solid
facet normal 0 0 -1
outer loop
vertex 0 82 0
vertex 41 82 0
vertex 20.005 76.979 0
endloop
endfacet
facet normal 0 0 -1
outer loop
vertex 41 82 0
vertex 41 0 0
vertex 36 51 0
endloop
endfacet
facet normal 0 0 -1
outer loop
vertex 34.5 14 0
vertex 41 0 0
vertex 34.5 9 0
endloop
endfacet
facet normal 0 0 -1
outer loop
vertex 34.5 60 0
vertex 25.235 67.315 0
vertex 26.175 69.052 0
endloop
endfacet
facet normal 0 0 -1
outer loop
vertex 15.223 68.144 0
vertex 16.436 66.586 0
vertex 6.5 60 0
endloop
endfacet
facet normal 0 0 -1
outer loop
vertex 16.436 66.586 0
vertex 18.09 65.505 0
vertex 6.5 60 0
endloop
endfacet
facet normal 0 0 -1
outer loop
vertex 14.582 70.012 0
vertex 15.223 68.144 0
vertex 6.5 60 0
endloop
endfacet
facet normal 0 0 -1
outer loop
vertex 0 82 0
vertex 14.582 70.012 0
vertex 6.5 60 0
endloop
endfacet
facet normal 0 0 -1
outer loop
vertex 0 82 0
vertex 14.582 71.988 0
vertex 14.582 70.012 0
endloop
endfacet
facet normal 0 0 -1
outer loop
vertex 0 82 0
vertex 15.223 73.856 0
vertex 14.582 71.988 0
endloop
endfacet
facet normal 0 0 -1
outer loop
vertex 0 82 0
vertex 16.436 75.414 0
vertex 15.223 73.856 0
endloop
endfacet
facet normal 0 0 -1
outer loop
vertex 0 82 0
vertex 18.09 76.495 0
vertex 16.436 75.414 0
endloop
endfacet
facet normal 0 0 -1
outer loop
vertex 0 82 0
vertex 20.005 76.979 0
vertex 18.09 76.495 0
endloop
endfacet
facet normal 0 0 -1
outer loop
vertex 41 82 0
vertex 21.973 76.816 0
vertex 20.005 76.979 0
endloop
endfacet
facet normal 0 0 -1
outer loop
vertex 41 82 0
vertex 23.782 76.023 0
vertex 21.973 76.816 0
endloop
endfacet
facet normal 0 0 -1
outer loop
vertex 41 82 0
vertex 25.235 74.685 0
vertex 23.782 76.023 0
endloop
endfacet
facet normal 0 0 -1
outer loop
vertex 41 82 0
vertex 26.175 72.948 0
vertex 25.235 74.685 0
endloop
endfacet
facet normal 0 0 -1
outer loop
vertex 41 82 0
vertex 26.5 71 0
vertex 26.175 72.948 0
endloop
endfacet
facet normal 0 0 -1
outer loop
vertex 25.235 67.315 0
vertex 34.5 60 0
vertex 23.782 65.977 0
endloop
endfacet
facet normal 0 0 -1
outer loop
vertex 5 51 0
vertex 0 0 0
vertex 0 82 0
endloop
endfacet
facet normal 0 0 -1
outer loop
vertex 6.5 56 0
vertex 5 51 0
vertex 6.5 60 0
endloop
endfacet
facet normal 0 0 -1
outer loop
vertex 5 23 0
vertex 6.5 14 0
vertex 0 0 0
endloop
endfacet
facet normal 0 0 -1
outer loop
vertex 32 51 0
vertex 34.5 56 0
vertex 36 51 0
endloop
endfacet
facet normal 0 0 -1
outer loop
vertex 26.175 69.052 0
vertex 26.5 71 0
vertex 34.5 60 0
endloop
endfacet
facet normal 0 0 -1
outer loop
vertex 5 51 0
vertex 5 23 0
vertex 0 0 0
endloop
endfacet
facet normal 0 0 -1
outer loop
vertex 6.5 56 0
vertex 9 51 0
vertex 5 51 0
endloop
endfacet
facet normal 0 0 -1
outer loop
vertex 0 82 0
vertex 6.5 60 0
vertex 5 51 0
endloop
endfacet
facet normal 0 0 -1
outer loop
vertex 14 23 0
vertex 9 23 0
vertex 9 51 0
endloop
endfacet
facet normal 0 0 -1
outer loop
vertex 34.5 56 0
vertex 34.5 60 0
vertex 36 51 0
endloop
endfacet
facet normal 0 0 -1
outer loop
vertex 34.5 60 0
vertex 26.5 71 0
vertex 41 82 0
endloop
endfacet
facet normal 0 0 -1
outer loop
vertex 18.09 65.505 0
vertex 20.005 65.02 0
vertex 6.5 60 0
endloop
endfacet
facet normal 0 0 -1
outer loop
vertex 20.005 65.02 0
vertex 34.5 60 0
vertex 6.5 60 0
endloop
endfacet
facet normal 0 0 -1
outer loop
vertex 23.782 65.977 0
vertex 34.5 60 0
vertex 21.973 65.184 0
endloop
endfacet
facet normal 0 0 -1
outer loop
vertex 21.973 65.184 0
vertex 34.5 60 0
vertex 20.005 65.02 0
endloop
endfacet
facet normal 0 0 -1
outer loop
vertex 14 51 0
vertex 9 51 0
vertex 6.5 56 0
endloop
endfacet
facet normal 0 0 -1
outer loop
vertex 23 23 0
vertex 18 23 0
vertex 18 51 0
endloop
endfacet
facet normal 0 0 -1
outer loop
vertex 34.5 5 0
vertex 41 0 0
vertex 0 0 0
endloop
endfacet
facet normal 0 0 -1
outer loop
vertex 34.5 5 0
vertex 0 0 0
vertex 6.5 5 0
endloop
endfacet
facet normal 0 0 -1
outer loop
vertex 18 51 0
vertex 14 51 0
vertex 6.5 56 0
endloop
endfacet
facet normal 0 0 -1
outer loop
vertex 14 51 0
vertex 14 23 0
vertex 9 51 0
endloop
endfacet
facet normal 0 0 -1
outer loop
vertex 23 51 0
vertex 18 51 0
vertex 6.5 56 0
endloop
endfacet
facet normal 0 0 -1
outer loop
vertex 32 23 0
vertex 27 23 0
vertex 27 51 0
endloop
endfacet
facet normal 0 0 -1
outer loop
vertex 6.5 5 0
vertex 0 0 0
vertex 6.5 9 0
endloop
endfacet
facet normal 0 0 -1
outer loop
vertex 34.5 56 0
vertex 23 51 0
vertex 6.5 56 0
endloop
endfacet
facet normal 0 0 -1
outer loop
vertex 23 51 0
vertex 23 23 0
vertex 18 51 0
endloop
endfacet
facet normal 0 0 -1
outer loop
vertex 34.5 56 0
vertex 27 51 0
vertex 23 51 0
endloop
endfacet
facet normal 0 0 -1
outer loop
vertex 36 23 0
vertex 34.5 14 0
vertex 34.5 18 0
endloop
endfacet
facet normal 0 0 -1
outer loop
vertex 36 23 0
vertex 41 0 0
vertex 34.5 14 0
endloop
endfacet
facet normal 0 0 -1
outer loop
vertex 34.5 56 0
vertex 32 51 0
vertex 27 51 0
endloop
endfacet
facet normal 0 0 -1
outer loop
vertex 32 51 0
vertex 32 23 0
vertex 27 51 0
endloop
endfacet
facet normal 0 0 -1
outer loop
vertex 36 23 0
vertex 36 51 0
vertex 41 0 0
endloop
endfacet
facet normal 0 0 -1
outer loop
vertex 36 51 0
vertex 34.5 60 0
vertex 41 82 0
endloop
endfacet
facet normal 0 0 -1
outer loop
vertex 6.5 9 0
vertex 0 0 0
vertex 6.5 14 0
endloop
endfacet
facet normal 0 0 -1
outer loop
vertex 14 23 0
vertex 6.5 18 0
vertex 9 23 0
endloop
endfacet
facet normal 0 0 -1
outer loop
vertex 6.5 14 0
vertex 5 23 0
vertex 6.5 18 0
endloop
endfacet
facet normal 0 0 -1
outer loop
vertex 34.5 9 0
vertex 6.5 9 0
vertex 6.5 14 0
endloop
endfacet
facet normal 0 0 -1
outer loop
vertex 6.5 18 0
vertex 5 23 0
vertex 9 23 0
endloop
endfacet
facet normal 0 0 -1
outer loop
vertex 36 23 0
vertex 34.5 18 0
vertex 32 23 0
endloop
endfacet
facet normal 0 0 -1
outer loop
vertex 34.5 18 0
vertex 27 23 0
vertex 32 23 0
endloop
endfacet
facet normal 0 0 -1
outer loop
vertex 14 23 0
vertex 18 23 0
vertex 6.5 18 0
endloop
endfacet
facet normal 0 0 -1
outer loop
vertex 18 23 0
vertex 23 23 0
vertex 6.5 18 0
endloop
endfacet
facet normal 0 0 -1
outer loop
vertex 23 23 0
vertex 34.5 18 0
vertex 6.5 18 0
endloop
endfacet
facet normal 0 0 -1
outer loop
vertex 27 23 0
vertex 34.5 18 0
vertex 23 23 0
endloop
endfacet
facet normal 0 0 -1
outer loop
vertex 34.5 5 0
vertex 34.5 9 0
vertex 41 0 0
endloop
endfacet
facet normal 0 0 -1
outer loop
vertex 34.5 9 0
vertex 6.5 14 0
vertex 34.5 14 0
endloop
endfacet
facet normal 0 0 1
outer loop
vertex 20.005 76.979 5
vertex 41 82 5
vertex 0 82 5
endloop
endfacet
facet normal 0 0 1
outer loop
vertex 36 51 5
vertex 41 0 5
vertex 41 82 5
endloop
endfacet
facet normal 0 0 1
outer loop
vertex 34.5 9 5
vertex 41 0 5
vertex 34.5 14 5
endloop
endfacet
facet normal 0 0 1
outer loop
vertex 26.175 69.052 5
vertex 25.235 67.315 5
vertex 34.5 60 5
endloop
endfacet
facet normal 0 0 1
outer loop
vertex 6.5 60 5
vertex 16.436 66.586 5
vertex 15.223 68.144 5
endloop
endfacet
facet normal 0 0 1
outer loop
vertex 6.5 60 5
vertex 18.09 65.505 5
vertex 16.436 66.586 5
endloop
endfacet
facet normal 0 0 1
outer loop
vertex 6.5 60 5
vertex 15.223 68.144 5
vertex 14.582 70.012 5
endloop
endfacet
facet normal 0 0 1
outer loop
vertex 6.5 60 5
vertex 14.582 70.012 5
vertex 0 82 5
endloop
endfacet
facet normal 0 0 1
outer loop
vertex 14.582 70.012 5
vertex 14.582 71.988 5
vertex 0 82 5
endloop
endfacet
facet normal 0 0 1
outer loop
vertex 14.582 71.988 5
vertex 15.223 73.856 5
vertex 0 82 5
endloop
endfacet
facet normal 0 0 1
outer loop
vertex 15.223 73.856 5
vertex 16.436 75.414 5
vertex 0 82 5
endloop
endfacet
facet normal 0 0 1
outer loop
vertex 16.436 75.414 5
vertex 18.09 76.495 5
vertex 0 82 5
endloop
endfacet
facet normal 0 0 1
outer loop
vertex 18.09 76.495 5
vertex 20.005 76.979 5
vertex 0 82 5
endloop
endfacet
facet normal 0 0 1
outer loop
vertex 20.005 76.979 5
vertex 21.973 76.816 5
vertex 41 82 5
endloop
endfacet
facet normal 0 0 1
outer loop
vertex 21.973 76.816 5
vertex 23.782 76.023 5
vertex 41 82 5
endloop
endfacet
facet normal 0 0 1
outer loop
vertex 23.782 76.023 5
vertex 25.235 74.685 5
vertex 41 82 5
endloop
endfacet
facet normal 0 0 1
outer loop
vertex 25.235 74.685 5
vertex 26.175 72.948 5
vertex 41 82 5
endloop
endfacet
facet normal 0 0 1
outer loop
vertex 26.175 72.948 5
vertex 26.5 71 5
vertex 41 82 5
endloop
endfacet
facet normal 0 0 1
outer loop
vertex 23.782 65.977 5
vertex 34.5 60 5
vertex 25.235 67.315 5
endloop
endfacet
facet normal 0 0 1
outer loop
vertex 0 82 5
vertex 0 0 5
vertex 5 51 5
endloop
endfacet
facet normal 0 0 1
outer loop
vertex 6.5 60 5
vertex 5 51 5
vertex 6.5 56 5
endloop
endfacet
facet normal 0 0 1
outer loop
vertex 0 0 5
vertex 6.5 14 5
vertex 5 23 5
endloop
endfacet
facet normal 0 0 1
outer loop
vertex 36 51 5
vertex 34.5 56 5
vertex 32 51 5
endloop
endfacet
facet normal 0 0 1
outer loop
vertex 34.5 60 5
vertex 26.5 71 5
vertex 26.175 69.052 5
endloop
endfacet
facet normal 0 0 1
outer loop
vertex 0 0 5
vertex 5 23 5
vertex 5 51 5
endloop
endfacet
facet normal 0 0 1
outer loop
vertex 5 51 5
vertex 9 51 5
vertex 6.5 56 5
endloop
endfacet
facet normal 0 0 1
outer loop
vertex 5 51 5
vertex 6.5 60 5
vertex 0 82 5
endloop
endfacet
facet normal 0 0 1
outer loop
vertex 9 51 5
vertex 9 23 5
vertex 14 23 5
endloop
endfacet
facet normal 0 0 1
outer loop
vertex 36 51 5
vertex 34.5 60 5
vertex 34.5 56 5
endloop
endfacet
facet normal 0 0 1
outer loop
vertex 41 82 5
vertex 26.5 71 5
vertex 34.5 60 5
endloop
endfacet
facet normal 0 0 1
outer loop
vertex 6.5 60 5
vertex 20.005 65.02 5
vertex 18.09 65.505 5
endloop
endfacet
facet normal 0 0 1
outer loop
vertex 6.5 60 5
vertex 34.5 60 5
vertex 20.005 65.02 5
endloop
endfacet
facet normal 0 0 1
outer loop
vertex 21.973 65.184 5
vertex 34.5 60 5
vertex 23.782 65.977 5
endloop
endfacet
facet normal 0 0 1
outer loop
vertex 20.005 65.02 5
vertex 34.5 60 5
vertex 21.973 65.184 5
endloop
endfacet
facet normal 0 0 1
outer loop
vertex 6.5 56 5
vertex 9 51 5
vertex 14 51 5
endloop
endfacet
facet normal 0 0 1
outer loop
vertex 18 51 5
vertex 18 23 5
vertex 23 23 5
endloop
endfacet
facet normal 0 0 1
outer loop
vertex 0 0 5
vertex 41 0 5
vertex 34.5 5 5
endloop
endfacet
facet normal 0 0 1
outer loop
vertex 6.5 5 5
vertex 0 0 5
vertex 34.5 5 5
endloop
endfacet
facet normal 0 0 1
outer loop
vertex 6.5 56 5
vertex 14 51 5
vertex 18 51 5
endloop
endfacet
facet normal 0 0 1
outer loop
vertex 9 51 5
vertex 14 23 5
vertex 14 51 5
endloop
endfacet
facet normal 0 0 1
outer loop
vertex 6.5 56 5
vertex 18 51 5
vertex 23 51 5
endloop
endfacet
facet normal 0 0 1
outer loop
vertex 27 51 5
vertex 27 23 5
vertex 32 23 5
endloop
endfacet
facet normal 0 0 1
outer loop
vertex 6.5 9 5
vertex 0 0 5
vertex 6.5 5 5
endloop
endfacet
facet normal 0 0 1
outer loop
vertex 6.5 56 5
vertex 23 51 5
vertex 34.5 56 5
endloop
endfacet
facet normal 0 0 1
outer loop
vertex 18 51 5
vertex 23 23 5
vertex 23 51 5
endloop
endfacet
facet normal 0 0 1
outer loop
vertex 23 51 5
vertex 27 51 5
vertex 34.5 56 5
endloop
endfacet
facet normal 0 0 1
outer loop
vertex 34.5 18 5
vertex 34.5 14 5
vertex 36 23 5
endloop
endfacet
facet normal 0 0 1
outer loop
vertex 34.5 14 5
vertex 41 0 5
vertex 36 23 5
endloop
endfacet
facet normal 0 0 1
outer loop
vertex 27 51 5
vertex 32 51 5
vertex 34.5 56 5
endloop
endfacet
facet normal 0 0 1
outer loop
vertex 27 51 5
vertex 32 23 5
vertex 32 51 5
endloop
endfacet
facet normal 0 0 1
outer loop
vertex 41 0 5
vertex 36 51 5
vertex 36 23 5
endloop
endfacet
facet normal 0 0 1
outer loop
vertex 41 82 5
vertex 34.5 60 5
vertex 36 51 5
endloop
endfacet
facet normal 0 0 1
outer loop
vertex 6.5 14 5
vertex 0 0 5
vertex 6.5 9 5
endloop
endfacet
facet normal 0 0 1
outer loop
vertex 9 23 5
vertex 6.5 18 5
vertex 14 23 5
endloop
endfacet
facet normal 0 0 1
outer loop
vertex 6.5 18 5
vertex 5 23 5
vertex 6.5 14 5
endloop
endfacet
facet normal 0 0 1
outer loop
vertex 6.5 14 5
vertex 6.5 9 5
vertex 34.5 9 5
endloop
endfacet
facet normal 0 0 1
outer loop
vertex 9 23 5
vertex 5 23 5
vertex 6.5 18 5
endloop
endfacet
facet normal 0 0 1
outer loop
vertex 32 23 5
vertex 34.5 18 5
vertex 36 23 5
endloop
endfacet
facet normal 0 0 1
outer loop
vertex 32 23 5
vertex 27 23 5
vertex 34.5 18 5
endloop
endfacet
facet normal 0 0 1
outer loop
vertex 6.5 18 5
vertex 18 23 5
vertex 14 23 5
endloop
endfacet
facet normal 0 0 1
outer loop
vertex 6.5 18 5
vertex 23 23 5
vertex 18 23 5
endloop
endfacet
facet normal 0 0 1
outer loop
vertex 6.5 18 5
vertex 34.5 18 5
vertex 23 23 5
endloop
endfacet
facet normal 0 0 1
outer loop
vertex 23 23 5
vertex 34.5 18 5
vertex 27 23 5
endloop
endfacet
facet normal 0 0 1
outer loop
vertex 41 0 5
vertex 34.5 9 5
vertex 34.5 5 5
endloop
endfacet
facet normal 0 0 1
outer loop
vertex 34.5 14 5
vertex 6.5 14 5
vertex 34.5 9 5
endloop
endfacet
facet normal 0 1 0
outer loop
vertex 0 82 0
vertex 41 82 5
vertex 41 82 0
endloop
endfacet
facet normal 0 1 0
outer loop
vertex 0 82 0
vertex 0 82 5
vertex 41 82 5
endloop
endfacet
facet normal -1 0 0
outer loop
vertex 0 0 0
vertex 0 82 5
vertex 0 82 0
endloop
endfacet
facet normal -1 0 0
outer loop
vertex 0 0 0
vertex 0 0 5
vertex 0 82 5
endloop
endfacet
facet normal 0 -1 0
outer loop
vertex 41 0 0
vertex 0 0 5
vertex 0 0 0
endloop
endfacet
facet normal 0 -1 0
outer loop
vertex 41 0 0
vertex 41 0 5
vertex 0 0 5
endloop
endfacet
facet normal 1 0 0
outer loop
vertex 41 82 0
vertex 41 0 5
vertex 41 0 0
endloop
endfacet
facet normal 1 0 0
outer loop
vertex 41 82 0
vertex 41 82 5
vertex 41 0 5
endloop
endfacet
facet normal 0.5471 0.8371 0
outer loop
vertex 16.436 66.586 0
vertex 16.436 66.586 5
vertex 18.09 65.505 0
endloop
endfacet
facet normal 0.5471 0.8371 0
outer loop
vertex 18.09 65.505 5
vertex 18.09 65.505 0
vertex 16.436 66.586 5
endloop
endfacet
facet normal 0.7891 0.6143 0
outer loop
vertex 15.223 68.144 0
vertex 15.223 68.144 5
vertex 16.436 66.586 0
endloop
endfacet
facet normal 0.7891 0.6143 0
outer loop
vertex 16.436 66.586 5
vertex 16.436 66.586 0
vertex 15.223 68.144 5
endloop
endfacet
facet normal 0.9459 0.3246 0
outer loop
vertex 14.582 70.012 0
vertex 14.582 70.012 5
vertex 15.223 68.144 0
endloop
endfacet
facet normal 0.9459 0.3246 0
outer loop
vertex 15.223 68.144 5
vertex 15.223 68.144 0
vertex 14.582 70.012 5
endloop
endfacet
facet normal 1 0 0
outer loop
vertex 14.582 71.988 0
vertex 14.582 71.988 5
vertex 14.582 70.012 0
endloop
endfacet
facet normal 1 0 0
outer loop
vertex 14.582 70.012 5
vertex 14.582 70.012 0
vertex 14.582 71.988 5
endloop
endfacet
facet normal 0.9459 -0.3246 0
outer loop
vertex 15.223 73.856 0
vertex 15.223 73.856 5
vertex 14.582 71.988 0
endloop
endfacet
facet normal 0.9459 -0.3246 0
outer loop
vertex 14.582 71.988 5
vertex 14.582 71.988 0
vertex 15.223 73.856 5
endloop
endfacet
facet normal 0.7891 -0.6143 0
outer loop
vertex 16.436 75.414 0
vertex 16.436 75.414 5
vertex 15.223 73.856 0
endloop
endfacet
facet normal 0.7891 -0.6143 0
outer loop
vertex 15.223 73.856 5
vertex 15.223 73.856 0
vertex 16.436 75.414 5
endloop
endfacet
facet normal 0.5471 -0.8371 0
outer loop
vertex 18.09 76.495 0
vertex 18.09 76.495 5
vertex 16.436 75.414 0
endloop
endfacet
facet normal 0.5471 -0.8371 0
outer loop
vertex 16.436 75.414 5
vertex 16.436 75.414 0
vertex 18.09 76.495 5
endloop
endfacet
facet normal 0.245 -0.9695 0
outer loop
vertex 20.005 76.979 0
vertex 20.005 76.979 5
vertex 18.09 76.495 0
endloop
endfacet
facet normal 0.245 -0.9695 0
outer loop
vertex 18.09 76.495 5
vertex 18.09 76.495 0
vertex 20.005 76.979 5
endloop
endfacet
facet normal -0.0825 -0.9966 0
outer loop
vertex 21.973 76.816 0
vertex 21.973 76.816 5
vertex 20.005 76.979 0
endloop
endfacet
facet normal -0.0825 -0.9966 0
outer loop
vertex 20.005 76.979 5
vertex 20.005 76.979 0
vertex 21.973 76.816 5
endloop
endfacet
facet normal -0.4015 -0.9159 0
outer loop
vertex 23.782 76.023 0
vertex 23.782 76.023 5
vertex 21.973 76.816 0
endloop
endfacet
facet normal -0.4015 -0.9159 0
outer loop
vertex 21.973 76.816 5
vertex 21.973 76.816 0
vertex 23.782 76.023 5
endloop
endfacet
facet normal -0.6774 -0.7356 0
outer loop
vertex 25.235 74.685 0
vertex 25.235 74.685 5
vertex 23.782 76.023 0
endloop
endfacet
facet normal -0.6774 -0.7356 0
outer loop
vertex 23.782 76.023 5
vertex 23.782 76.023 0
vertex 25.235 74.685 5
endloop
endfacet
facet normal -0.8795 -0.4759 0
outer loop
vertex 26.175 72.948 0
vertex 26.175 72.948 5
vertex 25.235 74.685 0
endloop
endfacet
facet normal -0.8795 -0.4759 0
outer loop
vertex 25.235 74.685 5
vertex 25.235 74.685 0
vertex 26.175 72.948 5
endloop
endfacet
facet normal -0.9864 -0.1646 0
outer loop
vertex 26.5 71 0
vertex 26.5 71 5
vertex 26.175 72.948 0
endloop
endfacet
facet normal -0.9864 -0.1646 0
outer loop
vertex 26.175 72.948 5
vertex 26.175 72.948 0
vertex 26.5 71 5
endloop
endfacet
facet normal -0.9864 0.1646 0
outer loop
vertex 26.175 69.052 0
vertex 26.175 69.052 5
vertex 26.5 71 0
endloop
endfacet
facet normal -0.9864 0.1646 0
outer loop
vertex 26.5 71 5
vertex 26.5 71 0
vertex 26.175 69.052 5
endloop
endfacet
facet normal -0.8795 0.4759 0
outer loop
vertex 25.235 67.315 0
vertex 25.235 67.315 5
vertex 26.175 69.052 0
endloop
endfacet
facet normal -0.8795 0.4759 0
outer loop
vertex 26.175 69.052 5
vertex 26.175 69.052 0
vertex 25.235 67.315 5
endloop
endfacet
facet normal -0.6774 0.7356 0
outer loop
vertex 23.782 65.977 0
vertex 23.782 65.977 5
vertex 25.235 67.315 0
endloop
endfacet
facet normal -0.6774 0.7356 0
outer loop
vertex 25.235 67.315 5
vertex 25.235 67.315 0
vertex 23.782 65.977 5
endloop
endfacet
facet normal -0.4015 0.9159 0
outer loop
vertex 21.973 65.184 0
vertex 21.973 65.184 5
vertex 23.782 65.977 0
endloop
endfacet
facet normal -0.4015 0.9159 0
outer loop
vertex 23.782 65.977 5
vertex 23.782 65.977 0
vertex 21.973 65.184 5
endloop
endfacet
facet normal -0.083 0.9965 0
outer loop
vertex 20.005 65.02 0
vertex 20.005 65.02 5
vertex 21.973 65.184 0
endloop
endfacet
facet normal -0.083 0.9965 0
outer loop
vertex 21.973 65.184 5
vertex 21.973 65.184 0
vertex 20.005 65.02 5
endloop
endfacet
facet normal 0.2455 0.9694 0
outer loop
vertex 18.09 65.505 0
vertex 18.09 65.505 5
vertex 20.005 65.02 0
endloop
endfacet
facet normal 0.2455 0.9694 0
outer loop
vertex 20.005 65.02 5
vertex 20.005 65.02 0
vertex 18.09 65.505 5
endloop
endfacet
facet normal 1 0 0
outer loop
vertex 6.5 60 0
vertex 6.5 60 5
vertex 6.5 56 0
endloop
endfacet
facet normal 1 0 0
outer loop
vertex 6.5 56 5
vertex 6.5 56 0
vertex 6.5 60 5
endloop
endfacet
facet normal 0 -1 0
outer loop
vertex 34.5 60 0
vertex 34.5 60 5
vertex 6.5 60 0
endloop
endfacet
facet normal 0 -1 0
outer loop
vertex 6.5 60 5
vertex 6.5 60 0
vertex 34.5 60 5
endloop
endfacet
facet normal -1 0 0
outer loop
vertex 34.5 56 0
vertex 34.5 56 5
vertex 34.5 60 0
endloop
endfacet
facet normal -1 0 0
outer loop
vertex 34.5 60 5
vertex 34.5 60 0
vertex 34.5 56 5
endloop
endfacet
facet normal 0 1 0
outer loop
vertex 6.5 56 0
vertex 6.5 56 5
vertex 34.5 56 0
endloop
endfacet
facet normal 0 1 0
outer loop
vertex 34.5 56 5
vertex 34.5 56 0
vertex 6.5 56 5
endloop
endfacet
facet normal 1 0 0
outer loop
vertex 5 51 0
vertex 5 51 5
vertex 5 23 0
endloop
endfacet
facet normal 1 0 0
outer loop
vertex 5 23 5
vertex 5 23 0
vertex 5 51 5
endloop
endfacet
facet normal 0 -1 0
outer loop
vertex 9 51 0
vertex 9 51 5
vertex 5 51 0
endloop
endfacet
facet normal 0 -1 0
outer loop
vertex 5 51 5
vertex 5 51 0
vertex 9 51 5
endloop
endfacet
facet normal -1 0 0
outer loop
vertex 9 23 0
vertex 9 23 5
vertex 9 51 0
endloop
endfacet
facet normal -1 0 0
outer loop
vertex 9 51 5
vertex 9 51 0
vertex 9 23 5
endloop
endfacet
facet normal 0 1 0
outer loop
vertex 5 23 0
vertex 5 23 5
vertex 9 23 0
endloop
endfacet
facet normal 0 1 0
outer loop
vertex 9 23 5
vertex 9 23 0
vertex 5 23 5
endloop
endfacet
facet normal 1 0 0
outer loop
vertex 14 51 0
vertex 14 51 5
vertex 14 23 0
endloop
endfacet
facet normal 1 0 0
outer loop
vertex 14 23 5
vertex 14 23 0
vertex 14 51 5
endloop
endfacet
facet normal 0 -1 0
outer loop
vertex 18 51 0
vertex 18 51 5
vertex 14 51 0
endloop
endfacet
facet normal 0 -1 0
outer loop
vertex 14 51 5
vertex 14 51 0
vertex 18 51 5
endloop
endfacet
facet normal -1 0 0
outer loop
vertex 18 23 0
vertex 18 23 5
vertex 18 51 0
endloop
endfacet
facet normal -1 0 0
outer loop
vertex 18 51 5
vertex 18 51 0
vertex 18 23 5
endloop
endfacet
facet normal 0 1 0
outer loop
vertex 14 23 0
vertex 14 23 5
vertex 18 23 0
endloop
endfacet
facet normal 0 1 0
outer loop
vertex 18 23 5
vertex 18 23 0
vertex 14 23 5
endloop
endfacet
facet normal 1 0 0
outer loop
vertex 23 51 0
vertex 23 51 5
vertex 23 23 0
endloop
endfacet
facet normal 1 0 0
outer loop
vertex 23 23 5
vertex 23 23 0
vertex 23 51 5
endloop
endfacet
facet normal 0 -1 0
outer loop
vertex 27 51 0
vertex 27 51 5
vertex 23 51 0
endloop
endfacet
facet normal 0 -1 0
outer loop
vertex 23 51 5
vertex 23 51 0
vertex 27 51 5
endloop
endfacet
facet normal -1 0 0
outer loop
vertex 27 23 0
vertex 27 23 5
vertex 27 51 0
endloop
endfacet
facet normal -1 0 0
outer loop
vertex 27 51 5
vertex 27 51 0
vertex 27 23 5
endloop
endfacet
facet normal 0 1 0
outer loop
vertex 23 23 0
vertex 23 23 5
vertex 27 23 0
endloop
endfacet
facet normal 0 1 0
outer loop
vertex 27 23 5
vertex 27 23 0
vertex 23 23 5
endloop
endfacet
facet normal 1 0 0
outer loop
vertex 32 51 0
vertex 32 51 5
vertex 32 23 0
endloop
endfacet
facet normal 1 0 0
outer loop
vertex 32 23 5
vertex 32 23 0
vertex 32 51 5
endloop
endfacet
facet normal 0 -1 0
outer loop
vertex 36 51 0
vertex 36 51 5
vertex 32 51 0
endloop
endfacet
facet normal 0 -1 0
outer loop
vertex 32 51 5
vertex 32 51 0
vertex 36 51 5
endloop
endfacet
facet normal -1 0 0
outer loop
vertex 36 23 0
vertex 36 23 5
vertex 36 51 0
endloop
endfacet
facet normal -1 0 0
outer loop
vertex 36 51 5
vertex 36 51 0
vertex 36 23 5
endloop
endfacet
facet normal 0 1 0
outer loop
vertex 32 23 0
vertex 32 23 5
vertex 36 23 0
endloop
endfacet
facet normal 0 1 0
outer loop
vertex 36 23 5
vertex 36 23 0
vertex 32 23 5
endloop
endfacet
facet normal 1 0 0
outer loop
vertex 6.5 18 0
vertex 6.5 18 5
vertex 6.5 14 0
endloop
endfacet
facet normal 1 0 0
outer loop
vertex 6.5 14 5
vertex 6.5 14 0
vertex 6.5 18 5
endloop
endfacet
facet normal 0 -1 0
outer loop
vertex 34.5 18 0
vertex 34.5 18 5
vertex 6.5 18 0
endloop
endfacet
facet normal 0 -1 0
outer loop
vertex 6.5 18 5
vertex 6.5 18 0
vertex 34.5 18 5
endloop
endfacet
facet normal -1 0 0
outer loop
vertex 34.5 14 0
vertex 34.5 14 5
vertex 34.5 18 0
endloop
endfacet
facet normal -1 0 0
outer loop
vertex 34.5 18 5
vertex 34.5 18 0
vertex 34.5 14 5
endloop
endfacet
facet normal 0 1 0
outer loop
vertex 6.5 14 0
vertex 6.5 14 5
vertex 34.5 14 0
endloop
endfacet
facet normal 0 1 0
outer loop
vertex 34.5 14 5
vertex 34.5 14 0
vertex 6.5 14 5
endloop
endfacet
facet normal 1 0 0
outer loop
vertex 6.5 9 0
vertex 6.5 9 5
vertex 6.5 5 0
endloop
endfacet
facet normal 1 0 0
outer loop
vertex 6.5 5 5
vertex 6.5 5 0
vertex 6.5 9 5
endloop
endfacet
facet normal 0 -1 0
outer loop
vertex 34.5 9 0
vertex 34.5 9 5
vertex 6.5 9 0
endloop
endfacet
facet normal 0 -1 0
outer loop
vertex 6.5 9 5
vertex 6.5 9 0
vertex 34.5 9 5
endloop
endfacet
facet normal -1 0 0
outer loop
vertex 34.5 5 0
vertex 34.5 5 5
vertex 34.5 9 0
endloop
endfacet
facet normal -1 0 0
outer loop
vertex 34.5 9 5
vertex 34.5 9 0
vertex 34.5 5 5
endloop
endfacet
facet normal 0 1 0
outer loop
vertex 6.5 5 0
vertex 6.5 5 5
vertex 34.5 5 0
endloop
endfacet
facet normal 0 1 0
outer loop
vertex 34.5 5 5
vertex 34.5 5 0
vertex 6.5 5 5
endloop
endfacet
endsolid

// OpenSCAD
webbing = 28;
gap = 4;
wall = 5;
height = 5;
hole = 6;

%cube([webbing, webbing, gap/2]);

width = (gap*4) + (wall*5); // webbing + (wall*2);
length = webbing + (gap*3) + (wall*6) + (hole*2);

linear_extrude(height=height)
difference() {
  square([width, length]);
  
  // Width Webbing Slots
  translate([width/2 - webbing/2,0]) {
    translate([0, wall])
    square([webbing, gap]);

    translate([0, gap + (wall*2)])
    square([webbing, gap]);

    translate([0, webbing + (gap*2) + (wall*4)])
    square([webbing, gap]);
  }

  // Center Webbing Slots
  translate([0,(gap*2) + (wall*3)])
  for (i = [0:3]) {
    translate([(gap*i) + (wall*(i+1)), 0])
    square([gap, webbing]);
  }

  // String Hole
  translate([width/2,length - hole - wall,0])
  #circle(r=hole);
}
